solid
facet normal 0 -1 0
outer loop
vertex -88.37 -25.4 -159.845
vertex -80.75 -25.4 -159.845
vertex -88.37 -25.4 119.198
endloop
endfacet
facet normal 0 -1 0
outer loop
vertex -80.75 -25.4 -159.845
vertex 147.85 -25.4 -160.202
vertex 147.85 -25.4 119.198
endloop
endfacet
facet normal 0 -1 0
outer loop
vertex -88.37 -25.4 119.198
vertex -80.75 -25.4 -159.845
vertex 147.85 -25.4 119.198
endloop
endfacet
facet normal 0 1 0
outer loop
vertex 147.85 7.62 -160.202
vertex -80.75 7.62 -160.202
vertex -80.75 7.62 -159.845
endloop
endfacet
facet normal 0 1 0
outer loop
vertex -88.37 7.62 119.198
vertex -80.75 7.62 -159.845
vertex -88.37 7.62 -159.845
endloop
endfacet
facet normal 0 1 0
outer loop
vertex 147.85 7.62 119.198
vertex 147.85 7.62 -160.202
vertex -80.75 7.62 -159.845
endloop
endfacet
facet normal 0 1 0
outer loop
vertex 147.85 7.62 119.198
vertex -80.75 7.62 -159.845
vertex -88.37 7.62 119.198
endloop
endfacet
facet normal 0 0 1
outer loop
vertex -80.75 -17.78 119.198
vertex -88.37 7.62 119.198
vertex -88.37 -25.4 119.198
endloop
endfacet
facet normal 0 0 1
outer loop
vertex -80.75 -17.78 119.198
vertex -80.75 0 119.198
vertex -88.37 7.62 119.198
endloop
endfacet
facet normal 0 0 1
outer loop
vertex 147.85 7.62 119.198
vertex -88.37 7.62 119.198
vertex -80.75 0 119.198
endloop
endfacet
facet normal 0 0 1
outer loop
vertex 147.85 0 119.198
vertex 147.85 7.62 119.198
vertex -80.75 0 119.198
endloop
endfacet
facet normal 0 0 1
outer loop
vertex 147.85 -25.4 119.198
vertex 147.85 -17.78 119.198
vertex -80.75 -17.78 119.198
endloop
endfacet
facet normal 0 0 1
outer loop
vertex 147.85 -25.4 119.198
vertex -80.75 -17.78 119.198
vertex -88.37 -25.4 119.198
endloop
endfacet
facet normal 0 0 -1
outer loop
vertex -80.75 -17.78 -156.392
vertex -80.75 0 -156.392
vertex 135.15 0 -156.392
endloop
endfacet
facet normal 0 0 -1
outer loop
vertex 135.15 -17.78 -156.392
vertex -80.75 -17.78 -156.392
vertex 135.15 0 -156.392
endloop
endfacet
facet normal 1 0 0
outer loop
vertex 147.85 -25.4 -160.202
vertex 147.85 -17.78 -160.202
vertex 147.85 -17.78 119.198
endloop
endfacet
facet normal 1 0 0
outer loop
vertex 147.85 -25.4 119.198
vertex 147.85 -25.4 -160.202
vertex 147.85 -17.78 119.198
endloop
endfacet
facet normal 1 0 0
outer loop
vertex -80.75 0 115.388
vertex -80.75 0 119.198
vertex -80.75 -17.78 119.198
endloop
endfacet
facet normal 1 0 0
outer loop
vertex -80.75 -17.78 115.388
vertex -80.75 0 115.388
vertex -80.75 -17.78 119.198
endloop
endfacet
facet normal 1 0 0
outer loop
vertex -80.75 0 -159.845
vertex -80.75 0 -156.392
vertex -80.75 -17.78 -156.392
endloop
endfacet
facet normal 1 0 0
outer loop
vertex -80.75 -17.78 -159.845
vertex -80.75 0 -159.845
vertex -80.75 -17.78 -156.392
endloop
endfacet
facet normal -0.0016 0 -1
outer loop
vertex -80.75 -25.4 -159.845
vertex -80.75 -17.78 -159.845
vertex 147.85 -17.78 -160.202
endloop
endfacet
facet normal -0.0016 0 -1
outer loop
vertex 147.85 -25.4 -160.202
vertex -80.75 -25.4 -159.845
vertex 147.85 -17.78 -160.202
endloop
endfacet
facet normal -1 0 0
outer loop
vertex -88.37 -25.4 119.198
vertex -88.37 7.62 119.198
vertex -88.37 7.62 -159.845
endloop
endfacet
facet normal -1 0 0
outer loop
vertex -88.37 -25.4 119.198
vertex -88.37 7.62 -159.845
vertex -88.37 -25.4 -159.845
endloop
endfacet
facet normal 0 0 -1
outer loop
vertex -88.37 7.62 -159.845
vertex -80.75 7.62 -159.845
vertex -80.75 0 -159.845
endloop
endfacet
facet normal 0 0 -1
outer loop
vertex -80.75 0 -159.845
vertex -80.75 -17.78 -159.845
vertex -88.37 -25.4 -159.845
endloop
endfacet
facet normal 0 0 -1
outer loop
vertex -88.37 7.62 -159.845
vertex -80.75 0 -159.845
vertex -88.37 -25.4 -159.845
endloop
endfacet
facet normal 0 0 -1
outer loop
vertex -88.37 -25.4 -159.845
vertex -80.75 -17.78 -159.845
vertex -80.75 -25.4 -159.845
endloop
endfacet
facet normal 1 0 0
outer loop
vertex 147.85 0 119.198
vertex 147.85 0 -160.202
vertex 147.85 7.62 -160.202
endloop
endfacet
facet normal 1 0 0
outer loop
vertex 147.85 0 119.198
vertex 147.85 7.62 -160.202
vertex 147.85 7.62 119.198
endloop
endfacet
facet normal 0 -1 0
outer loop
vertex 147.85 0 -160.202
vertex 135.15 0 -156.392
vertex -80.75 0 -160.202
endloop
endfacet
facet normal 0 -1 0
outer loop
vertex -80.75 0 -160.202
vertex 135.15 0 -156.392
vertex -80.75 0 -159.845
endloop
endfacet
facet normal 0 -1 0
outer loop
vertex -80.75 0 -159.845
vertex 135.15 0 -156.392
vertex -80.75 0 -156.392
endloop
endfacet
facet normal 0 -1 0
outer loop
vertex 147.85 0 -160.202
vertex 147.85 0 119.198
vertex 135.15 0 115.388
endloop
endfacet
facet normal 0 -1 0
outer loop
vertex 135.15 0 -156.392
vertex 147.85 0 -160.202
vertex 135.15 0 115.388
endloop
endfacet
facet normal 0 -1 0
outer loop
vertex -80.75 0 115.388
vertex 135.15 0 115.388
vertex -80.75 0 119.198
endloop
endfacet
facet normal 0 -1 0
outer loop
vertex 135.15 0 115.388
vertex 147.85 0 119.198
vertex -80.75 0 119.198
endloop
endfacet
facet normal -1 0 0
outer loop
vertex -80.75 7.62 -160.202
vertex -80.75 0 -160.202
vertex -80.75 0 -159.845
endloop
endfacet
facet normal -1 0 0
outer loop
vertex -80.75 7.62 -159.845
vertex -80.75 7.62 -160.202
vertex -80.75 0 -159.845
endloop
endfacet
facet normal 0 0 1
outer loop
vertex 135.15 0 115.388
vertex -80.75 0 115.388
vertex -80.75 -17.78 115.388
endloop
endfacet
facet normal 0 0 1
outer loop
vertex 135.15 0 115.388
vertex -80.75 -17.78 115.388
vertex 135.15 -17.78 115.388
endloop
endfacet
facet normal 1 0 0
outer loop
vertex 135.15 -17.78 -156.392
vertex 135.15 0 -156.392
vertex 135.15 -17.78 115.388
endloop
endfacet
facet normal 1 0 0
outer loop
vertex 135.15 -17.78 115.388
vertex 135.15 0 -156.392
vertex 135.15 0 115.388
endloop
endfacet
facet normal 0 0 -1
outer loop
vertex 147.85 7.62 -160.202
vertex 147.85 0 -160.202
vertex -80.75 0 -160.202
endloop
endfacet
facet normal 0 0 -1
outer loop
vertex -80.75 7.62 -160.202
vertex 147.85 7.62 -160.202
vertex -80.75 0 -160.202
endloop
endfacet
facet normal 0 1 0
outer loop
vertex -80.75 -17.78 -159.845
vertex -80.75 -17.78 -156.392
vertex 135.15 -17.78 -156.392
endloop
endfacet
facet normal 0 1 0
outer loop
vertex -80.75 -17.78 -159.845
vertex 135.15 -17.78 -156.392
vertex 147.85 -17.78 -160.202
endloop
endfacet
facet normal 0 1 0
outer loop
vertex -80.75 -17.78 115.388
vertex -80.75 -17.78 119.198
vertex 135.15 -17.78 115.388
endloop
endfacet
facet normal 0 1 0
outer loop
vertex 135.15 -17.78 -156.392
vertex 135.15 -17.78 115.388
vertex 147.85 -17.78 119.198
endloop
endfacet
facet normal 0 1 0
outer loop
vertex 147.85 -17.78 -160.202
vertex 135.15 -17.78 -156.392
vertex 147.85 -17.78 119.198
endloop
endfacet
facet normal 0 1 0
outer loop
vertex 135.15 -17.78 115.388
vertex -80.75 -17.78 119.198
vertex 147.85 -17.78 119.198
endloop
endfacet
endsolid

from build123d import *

# Parameters (mm, degrees)
F0_W     = 215.9
F0_H     = 271.78
F1_DEPTH = 17.78
F4_DEPTH = 7.62
F3_W     = 228.6
F3_H     = 279.4
F5_DEPTH = 7.62
F6_W     = 33.02
F6_H     = 279.043264
F7_DEPTH = 7.62


with BuildPart() as f1:
    # F0 (on Front) → F1 (new body)
    with BuildSketch(Plane.XZ):
        with Locations((27.200282, -20.502186)):
            Rectangle(F0_W, F0_H)
    extrude(amount=F1_DEPTH)

    # F2 (on face) → F4 (join)
    with BuildSketch(Plane.XZ.offset(17.78)):
        Polygon((147.850282, -160.202186), (147.850282, 119.197814), (-80.749718, 119.197814), (-80.749718, -159.84545), align=None)
    extrude(amount=F4_DEPTH)

    # F3 (on face) → F5 (join)
    with BuildSketch(Plane(origin=(0, 0, 0), x_dir=(-1, 0, 0), z_dir=(0, 1, 0))):
        with Locations((-33.550282, -20.502186)):
            Rectangle(F3_W, F3_H)
    extrude(amount=F5_DEPTH)

    # F6 (on face) → F7 (join)
    with BuildSketch(Plane(origin=(-80.749718, 0, 0), x_dir=(0, -1, 0), z_dir=(-1, 0, 0))):
        with Locations((8.89, -20.323818)):
            Rectangle(F6_W, F6_H)
    extrude(amount=F7_DEPTH)


solid = f1.part
